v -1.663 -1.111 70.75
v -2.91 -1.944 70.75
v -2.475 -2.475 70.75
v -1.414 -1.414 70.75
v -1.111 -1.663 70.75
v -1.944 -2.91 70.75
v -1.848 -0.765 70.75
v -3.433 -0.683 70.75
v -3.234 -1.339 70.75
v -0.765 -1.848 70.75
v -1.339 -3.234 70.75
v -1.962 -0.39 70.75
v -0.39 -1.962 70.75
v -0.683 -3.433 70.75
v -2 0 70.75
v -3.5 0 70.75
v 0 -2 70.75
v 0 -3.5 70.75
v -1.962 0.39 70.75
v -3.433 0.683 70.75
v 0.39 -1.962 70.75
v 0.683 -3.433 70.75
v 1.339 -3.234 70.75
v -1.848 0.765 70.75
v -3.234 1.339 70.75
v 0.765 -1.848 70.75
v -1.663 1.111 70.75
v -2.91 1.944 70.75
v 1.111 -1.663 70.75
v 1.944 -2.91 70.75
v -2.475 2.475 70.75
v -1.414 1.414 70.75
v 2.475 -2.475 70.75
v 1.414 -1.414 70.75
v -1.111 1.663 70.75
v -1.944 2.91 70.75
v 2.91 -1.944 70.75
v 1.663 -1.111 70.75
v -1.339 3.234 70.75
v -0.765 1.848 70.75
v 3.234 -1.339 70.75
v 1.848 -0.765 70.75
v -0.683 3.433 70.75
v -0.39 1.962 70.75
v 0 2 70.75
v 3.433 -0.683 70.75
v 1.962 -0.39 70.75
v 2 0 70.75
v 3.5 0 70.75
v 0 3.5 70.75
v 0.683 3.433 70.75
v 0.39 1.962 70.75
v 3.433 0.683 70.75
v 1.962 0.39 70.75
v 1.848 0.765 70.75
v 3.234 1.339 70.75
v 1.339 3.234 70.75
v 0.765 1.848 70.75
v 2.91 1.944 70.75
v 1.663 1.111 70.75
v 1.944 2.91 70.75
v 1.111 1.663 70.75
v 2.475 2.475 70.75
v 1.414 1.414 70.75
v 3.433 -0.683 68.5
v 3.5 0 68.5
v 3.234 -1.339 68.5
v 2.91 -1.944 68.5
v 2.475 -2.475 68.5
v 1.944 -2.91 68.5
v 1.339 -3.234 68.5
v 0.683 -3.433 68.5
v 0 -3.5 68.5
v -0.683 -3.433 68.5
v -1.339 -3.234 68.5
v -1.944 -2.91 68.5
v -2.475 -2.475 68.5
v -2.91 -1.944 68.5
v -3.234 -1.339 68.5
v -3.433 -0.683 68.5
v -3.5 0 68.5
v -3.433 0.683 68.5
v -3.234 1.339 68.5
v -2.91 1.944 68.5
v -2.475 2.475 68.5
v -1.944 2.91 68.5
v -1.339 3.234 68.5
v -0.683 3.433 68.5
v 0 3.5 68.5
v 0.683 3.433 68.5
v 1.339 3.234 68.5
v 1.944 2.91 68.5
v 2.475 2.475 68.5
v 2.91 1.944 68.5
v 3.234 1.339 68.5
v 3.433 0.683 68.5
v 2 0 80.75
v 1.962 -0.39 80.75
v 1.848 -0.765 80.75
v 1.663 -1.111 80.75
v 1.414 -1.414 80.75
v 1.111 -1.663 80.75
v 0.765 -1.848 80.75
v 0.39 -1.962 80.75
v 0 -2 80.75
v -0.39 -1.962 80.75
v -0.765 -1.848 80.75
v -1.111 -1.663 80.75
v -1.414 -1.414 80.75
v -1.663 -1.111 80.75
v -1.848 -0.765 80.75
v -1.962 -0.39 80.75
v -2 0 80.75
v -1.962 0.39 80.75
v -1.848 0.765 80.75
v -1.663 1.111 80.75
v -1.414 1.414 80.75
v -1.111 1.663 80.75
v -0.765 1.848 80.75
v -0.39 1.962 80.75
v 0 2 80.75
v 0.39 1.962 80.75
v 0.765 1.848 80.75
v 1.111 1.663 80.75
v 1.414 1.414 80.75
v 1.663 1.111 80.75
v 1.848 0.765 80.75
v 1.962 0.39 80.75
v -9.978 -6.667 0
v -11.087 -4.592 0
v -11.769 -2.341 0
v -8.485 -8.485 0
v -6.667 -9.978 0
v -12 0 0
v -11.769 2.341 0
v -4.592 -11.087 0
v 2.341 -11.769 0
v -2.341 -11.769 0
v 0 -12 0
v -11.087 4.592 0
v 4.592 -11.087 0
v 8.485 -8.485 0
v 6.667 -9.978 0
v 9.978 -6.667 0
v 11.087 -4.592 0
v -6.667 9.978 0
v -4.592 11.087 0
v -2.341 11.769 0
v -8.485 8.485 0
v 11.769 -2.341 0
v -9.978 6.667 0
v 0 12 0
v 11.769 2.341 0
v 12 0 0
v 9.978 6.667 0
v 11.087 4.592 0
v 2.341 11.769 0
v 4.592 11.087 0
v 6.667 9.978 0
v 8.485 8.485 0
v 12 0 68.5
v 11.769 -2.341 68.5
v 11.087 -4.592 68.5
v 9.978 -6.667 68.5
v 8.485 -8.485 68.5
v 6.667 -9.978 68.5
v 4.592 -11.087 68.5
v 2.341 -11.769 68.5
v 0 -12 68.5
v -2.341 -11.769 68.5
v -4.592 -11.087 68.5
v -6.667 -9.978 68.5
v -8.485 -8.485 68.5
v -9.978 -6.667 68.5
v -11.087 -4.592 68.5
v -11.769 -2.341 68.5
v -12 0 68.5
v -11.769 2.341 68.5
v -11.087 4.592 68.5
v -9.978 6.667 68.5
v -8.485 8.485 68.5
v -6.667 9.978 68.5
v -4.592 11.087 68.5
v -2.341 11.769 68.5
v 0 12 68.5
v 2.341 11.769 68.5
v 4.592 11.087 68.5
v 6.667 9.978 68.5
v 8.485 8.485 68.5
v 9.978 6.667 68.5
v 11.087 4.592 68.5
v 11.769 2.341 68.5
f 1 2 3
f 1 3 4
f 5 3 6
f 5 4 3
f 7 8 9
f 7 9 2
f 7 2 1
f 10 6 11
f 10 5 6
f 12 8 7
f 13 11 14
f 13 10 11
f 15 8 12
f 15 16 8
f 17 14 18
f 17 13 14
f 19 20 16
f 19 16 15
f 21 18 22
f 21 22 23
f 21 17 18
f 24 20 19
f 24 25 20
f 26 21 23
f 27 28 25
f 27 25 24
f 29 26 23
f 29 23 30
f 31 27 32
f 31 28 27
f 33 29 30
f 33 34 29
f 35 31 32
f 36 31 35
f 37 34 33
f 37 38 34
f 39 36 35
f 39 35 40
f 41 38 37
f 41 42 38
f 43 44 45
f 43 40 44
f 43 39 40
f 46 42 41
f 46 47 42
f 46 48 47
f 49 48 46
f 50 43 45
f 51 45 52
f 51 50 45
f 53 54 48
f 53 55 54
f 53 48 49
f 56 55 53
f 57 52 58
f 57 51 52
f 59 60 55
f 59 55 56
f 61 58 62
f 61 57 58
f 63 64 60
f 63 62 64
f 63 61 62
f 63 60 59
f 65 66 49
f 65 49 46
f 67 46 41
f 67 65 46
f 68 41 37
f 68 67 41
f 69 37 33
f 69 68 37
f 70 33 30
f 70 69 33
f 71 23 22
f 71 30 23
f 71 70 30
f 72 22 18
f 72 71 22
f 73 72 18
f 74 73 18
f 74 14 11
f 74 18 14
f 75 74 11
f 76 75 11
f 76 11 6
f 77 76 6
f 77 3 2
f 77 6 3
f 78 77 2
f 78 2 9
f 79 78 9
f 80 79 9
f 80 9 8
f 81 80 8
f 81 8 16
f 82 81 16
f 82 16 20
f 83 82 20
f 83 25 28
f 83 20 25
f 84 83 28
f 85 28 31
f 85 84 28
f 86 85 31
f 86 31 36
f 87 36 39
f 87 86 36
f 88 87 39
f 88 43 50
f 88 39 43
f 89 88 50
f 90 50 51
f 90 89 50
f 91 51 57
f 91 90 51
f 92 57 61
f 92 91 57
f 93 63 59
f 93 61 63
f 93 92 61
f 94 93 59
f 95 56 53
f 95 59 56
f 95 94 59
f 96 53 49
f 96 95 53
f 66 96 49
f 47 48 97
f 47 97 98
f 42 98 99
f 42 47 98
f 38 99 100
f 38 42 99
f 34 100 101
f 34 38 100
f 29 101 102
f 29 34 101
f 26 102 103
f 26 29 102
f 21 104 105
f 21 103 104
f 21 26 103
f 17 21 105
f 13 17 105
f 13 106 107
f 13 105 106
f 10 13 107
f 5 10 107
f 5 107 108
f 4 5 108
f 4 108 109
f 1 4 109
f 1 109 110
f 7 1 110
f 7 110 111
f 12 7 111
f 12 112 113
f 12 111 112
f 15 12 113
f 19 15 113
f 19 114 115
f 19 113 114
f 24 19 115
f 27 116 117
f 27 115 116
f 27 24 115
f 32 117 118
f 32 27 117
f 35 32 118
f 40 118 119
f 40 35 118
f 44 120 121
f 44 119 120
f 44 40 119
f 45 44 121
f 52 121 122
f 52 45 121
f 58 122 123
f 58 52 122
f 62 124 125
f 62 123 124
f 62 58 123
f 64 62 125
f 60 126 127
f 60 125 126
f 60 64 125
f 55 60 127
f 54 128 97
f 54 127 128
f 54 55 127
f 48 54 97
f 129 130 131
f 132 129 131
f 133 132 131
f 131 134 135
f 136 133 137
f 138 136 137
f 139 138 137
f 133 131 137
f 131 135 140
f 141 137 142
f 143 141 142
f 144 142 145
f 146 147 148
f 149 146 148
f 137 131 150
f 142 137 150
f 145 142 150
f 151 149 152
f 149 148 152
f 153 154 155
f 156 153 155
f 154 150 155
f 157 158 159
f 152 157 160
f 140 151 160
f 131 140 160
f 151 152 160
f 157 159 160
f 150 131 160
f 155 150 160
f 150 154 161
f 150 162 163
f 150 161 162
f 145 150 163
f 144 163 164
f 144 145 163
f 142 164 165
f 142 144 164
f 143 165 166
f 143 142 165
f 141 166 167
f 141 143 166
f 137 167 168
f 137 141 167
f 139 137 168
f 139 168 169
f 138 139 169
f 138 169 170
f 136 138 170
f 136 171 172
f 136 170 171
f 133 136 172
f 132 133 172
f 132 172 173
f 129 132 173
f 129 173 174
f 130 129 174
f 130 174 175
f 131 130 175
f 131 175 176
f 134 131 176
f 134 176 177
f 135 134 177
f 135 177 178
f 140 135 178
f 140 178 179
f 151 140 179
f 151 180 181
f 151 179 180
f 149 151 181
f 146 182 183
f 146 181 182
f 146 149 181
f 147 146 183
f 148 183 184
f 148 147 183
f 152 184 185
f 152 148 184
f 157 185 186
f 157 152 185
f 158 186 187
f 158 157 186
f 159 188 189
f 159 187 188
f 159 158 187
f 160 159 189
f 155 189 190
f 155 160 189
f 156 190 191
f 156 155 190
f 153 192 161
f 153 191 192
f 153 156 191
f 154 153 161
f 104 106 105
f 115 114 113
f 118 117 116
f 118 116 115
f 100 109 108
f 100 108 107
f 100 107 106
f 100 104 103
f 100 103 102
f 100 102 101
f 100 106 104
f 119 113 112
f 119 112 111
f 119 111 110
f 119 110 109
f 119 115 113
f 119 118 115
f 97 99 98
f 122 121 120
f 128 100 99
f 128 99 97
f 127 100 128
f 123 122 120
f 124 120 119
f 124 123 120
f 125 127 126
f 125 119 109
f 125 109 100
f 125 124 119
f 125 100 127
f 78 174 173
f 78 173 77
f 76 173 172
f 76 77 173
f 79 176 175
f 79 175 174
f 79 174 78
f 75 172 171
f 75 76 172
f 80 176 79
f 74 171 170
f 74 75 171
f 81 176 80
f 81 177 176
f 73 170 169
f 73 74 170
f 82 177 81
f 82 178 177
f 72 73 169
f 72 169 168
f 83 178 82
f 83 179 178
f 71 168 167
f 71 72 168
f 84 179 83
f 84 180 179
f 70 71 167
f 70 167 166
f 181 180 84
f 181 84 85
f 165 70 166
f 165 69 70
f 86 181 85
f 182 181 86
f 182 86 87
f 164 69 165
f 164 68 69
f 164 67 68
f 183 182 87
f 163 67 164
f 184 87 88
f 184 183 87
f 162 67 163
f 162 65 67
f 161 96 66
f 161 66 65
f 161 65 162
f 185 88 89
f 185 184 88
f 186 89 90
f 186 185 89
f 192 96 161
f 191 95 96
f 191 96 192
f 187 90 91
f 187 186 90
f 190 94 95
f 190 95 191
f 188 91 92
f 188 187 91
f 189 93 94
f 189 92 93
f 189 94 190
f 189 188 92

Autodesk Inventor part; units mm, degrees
ref_plane "YZ Plane" through (0, 0, 0) normal (1, 0, 0) x (0, 1, 0)
ref_plane "XZ Plane" through (0, 0, 0) normal (0, 1, 0) x (-1, 0, 0)
ref_plane "XY Plane" through (0, 0, 0) normal (0, 0, 1) x (1, 0, 0)
sketch "Sketch1" plane through (0, 0, 0) normal (0, 0, 1) x (1, 0, 0)
  circle A0 centre (0, 0) radius 12
  dimension "d0" = 24
extrude "Extrusion1" add sketch "Sketch1" along normal blind 68.5
sketch "Sketch2" plane through (0, 0, 68.5) normal (0, 0, 1) x (1, 0, 0)
  circle A0 centre (0, 0) radius 3.5
  dimension "d3" = 7
extrude "Extrusion2" add sketch "Sketch2" along normal blind 2.25
sketch "Sketch3" plane through (0, 0, 70.75) normal (0, 0, 1) x (1, 0, 0)
  circle A0 centre (0, 0) radius 3.5 projected
  circle A1 centre (0, 0) radius 2
  dimension "d6" = 4
extrude "Extrusion3" add sketch "Sketch3" along normal blind 10 contours A1
properties part number "Motor_elevation"
